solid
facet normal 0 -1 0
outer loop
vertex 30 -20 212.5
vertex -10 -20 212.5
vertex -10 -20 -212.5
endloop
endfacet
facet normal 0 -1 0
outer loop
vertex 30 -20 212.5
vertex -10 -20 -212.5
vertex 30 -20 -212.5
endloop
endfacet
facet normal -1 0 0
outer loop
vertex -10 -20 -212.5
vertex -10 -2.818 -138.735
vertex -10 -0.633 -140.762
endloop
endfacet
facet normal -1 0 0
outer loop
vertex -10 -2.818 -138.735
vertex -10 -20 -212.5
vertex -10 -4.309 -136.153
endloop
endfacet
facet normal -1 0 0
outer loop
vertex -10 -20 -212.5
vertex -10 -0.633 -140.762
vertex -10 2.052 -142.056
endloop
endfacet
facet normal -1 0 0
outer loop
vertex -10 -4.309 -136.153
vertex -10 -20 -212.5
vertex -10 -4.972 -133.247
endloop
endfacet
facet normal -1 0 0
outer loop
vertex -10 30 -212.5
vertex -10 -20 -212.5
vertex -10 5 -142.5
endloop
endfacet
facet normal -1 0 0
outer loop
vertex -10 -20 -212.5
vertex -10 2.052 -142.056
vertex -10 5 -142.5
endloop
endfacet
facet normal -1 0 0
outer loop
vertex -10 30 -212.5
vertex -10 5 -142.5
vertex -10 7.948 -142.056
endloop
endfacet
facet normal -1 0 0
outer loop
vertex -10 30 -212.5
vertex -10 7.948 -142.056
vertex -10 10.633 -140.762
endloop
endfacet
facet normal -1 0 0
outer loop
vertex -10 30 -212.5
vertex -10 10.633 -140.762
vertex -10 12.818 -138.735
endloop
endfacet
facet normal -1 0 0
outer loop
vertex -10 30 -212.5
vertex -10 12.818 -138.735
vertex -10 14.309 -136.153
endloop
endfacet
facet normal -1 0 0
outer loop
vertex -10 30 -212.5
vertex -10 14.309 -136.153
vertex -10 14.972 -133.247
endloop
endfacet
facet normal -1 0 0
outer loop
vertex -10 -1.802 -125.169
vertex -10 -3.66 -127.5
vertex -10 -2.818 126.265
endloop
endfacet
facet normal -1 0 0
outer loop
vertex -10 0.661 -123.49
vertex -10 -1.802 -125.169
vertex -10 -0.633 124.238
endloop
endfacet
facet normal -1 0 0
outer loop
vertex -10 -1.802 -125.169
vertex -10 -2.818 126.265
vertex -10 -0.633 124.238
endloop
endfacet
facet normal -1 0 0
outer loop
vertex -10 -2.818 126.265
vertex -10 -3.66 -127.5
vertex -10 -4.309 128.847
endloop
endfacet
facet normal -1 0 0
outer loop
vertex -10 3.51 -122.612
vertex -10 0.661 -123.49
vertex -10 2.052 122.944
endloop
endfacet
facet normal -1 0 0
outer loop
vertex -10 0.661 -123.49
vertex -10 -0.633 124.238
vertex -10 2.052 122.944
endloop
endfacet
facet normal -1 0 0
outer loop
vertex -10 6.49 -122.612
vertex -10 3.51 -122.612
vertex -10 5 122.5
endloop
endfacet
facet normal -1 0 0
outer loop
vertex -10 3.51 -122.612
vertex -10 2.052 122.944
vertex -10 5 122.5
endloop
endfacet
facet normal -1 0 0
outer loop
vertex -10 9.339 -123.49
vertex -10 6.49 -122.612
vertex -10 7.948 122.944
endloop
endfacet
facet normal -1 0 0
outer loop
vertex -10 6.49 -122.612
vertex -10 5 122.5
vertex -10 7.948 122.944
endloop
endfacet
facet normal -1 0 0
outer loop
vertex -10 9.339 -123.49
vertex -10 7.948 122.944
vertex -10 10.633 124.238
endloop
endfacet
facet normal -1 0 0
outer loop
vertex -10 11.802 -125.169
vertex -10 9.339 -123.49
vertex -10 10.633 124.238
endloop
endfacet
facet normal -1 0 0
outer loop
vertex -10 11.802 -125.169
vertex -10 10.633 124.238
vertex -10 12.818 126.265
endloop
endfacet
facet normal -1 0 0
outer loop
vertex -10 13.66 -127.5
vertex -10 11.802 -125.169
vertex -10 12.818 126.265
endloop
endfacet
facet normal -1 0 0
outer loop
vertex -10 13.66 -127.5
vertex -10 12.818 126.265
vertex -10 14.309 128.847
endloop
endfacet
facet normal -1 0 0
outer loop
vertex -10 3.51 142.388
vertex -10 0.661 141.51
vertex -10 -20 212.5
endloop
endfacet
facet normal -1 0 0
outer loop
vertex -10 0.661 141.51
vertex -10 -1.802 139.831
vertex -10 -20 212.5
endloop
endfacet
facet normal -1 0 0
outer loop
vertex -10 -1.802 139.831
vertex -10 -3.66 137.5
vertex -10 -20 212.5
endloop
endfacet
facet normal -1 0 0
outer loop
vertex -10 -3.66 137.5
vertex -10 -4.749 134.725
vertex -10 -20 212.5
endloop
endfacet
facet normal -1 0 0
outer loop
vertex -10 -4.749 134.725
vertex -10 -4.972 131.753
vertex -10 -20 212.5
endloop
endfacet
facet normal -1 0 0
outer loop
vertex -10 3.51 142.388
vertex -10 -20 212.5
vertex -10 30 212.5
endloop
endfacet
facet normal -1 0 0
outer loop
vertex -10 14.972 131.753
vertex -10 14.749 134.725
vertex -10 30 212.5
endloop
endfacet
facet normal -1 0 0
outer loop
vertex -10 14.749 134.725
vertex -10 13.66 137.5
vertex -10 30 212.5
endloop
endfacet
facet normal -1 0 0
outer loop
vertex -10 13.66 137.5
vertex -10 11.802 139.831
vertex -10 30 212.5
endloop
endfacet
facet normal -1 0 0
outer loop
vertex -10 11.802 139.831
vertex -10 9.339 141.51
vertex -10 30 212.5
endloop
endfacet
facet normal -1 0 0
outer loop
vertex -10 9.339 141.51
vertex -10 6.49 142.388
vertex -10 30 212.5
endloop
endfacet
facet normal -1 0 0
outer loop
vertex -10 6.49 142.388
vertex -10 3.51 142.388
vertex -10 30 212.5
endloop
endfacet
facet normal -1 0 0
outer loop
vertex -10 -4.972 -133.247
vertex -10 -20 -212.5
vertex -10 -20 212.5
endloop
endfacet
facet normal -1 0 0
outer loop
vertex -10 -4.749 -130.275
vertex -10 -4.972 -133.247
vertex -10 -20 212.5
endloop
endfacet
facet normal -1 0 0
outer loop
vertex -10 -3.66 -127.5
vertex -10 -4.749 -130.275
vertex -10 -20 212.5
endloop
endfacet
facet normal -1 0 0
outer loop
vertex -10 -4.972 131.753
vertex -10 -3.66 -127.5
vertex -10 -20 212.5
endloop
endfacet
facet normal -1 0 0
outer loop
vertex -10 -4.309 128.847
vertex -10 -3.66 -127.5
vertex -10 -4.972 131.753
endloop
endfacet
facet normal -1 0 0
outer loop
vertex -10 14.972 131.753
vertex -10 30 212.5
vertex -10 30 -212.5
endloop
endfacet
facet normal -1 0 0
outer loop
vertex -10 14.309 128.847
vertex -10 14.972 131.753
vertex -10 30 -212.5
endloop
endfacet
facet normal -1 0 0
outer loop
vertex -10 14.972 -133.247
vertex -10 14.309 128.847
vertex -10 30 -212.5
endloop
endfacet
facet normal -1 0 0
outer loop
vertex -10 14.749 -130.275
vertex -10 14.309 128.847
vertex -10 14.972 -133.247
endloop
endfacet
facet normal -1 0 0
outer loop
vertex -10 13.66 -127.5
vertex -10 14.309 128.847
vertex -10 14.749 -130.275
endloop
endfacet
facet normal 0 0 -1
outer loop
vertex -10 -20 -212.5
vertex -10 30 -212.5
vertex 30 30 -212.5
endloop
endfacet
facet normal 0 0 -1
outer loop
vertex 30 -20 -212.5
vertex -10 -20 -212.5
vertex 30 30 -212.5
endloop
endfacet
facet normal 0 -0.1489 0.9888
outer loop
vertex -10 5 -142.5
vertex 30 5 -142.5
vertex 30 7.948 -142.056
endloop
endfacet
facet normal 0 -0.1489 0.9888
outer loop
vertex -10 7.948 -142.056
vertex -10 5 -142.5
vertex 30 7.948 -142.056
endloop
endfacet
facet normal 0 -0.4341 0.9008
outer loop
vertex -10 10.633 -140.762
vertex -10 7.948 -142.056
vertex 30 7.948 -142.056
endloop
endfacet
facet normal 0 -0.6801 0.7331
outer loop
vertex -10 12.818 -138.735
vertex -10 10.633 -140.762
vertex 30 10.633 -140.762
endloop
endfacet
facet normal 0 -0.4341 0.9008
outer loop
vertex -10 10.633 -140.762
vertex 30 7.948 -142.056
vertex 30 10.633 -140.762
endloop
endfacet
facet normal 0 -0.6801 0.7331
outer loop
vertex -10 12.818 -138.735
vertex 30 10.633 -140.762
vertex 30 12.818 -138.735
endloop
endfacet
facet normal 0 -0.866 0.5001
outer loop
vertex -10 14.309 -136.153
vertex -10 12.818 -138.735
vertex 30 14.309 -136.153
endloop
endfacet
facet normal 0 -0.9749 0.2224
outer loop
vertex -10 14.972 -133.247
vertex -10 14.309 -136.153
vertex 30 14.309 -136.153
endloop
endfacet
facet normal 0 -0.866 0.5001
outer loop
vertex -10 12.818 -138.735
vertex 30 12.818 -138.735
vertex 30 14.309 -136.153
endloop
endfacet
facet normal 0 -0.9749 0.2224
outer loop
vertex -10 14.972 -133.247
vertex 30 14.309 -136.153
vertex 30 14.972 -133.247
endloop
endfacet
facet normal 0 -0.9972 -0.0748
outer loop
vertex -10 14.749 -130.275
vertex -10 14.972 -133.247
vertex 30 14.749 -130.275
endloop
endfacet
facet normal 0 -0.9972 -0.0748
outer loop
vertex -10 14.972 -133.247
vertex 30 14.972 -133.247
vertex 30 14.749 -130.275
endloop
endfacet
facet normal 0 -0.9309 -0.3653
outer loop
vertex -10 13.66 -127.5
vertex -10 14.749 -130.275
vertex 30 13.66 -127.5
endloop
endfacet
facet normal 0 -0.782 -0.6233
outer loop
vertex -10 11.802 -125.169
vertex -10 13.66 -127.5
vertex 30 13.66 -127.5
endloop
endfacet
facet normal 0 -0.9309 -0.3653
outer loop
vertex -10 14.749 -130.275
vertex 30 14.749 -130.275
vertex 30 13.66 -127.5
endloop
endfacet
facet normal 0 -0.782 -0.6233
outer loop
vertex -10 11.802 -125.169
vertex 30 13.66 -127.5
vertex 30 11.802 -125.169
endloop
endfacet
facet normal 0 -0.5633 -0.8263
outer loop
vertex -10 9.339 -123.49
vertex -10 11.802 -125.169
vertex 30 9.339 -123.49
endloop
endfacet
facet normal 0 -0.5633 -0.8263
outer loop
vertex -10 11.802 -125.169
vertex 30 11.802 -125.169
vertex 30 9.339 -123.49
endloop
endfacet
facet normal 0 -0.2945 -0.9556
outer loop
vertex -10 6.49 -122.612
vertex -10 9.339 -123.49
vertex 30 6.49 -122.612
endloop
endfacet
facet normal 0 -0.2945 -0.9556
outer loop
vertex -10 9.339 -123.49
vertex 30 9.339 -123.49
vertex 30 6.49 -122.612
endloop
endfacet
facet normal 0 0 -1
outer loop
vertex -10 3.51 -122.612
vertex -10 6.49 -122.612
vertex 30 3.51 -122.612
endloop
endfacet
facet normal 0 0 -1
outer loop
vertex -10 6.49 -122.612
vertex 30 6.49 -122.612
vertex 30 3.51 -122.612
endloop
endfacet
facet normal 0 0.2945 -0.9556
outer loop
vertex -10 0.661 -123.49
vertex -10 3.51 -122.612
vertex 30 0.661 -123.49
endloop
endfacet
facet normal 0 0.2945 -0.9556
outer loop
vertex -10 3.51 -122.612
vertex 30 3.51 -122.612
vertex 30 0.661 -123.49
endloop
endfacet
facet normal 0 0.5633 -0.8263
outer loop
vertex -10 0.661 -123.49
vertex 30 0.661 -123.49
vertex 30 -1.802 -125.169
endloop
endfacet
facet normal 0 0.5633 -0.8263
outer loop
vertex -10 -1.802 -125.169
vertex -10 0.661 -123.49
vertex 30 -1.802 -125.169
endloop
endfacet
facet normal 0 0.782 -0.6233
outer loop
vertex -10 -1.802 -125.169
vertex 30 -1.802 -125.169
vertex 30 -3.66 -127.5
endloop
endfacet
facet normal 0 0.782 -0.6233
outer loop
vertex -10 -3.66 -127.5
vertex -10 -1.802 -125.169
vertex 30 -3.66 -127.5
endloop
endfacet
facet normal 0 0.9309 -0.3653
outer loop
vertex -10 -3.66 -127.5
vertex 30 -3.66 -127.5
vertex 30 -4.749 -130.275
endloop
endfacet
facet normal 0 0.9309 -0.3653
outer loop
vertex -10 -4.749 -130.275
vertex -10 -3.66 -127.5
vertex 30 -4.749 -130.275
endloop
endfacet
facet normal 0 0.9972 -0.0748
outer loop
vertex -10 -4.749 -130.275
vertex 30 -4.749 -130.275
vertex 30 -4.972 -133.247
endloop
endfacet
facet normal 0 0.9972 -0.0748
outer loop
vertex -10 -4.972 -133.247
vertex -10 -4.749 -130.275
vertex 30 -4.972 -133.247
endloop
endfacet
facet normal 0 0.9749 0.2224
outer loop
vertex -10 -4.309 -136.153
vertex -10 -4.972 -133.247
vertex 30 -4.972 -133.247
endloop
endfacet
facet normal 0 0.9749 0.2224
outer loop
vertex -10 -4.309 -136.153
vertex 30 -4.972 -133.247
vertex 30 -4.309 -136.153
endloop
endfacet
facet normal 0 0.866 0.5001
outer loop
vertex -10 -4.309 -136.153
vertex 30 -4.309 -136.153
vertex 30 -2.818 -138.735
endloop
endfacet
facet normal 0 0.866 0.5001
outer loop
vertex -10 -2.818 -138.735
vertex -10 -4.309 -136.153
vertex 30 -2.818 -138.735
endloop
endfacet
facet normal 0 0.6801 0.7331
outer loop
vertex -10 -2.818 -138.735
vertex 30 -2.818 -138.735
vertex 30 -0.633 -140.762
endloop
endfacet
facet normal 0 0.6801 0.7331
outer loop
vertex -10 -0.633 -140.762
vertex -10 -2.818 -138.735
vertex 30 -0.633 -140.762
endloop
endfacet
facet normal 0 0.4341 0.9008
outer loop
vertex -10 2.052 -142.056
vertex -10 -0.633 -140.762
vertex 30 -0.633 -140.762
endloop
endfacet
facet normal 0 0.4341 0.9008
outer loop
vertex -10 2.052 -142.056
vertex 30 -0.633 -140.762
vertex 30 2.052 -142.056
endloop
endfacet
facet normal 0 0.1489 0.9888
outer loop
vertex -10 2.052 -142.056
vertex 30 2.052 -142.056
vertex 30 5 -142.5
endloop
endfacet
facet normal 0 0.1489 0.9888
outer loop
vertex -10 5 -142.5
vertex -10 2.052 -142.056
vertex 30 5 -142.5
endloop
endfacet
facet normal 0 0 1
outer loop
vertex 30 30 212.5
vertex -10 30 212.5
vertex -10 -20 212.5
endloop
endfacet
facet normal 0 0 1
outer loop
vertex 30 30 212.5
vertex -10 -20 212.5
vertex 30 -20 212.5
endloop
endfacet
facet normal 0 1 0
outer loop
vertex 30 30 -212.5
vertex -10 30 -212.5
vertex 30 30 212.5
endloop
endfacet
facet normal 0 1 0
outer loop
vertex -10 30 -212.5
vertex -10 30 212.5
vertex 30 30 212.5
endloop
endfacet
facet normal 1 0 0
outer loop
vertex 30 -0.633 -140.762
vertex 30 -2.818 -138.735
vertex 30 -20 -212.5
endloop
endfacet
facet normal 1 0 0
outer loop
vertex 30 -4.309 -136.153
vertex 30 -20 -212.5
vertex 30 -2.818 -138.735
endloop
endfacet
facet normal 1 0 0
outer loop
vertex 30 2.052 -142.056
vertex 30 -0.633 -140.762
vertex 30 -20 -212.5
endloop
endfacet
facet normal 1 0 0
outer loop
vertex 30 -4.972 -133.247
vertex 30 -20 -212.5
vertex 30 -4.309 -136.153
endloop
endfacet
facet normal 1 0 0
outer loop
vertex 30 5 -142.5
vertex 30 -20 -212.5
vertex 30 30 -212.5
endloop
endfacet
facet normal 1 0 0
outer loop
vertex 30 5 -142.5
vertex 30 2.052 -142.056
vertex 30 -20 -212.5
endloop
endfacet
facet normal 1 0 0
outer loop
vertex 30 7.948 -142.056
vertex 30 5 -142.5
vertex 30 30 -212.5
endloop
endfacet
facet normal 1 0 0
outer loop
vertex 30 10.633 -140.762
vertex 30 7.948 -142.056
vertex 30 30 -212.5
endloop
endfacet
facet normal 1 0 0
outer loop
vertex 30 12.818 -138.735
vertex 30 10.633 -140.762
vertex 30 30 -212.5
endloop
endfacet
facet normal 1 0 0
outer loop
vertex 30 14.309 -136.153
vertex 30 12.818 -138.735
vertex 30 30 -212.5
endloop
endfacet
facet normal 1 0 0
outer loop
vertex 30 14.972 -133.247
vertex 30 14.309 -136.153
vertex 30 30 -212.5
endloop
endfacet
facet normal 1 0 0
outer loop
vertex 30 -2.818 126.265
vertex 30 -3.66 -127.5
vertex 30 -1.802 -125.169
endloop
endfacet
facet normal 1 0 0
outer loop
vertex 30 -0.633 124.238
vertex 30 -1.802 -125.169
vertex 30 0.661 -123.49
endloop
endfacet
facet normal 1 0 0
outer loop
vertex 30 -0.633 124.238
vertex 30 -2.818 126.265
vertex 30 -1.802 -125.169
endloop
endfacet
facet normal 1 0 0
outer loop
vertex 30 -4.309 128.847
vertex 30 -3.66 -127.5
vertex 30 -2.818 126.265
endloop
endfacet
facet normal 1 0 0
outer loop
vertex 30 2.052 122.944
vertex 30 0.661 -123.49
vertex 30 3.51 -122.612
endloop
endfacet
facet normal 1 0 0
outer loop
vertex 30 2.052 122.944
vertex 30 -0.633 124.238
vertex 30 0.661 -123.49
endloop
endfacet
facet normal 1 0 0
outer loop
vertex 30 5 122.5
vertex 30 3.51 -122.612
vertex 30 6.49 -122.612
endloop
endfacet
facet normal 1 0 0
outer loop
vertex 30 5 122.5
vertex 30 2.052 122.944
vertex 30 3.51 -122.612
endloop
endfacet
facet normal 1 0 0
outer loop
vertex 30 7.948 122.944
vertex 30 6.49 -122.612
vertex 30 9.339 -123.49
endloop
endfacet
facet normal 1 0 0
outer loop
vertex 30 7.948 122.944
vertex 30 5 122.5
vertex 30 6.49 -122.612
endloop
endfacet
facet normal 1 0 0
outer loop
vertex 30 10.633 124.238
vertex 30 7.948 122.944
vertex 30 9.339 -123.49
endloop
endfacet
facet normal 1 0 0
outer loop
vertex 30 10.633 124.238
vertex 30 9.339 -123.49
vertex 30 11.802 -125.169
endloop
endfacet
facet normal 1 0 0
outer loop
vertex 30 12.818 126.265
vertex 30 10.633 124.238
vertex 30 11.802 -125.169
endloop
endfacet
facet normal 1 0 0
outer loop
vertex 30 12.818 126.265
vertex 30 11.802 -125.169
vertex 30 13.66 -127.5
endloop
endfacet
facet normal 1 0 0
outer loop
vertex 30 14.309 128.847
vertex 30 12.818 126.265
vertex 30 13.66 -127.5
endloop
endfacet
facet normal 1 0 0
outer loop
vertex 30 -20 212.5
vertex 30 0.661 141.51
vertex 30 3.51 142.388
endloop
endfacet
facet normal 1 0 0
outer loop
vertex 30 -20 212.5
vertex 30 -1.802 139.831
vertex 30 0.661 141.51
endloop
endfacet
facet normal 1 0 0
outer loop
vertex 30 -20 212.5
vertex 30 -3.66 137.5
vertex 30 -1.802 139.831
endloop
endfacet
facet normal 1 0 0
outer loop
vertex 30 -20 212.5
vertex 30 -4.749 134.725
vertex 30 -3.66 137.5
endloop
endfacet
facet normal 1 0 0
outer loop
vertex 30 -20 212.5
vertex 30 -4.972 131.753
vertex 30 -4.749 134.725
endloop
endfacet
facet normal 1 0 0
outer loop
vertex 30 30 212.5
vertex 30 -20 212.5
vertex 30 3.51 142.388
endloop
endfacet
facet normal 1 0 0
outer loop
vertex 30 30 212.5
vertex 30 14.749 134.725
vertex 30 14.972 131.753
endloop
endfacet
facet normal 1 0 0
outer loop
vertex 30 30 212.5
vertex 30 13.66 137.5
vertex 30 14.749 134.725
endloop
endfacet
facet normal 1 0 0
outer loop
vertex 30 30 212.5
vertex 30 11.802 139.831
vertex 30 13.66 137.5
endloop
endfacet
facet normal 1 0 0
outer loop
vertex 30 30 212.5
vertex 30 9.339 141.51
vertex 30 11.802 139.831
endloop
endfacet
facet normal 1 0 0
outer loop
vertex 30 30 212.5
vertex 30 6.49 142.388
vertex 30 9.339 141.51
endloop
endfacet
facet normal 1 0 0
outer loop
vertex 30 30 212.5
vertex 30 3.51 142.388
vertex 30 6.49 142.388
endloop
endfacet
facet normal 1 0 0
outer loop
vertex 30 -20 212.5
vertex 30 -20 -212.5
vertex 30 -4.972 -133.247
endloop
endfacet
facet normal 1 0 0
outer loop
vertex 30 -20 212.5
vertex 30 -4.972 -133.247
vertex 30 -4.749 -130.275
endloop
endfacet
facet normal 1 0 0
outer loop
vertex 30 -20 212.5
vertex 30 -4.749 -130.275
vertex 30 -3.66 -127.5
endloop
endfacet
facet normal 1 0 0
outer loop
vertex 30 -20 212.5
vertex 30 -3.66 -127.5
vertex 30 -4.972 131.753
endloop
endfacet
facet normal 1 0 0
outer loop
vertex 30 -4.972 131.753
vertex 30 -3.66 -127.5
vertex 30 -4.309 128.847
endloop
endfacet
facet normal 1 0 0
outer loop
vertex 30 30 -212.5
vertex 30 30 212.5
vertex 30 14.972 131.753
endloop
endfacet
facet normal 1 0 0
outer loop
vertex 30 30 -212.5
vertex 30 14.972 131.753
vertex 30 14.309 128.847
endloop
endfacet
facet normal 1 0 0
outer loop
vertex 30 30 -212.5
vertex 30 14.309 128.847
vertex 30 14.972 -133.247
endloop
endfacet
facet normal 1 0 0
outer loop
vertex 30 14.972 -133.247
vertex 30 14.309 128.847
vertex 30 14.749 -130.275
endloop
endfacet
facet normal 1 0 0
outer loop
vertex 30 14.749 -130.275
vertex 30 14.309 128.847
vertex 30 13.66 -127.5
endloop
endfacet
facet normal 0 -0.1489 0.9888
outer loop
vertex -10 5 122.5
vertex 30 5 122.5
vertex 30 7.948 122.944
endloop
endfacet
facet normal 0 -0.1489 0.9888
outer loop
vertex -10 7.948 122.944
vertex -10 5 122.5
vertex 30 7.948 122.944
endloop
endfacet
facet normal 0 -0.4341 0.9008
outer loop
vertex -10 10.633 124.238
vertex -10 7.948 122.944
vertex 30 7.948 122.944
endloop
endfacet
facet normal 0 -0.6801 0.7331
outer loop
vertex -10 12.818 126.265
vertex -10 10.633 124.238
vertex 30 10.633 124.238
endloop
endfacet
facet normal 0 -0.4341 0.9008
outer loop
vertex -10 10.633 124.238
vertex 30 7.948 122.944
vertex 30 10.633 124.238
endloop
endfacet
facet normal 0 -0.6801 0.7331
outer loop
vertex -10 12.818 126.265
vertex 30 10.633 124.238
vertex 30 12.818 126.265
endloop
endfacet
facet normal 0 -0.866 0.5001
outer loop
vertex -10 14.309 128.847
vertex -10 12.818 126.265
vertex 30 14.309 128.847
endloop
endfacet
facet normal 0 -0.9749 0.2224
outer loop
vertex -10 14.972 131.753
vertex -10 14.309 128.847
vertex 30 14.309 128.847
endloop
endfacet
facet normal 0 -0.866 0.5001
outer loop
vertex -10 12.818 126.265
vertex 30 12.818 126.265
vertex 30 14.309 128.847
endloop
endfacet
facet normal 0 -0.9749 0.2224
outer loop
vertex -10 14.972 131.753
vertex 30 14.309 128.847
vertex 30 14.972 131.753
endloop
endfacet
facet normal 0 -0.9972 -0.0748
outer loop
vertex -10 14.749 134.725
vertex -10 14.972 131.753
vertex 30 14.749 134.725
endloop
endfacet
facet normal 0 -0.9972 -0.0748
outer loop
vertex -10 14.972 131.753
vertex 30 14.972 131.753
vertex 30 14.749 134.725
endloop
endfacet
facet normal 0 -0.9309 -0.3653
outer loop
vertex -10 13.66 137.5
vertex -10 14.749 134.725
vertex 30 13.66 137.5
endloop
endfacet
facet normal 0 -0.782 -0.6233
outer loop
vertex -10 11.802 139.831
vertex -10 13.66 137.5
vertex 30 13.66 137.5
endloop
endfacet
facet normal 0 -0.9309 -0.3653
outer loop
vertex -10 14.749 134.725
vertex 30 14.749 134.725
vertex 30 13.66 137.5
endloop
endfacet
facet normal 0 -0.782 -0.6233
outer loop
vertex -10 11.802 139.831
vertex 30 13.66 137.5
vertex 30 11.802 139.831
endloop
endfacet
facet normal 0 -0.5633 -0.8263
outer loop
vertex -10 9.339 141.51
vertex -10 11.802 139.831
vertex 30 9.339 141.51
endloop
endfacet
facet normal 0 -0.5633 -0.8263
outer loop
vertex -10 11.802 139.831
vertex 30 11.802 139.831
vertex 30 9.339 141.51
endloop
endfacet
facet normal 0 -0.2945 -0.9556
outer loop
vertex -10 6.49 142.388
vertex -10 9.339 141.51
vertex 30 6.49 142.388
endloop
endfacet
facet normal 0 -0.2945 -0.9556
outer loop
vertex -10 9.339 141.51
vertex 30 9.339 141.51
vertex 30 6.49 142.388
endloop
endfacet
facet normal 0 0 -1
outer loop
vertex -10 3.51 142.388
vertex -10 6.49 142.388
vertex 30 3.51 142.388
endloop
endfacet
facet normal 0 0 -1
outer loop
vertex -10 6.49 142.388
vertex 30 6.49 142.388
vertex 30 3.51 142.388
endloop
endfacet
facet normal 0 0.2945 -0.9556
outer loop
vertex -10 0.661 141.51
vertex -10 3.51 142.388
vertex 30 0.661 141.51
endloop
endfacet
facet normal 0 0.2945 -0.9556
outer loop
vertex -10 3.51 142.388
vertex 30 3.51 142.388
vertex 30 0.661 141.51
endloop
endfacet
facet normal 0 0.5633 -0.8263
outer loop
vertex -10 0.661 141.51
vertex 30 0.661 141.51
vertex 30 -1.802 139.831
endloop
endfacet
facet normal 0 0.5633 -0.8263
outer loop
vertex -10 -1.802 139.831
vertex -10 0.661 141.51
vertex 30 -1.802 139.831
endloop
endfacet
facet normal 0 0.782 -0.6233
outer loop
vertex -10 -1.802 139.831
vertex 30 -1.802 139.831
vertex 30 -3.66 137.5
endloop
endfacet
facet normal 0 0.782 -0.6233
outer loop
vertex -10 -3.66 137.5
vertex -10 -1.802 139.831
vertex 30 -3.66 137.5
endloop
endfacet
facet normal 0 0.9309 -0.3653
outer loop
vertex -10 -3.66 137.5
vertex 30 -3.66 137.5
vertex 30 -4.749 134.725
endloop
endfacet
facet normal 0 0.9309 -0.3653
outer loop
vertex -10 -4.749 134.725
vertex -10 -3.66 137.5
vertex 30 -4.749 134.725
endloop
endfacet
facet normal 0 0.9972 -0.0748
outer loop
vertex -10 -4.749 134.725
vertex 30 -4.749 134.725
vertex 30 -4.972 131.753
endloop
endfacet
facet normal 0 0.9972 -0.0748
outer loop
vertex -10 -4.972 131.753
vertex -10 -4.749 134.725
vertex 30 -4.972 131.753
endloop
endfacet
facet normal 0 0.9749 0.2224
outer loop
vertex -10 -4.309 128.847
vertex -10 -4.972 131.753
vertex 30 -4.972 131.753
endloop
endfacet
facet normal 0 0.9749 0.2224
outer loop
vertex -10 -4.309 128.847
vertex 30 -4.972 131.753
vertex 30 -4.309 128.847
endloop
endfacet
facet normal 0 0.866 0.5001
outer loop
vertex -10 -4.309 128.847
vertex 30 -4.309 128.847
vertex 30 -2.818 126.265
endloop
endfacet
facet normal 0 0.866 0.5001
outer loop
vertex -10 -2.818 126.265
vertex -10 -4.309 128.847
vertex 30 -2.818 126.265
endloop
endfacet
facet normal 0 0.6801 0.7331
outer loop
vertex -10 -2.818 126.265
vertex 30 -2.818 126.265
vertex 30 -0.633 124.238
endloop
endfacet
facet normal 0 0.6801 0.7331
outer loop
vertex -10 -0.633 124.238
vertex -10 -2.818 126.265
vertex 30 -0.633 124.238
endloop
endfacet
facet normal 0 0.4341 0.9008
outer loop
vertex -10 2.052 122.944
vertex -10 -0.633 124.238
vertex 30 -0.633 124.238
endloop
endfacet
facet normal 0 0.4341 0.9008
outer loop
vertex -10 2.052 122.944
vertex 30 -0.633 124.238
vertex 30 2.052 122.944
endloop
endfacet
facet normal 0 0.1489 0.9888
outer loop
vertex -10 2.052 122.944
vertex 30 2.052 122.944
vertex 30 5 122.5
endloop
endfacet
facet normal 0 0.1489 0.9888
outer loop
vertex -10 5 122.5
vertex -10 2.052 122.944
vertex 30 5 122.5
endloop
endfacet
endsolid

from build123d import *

# Parameters (mm, degrees)
SKETCH_1_W          = 40
SKETCH_1_H          = 50
EXTRUDE_1_DEPTH     = 212.5
CUT_EXTRUDE_1_REACH = 220.303
SKETCH_2_R          = 10


with BuildPart() as part:
    # 草图1 → 凸台-拉伸1 (new, symmetric)
    with BuildSketch(Plane.XY):
        with Locations((10, 5)):
            Rectangle(SKETCH_1_W, SKETCH_1_H)
    extrude(amount=EXTRUDE_1_DEPTH, both=True)

    # 草图2 → 切除-拉伸1 (cut, up to next)
    with BuildSketch(Plane(origin=(30, 0, 0), x_dir=(0, 0, -1), z_dir=(1, 0, 0)), mode=Mode.PRIVATE) as cut_extrude_1_sk1:
        with Locations((-132.5, 5)):
            Circle(SKETCH_2_R)
    cut_extrude_1_tool1 = extrude(cut_extrude_1_sk1.sketch, amount=-CUT_EXTRUDE_1_REACH, mode=Mode.PRIVATE) & part.part
    # 草图2 → 切除-拉伸1 (cut, up to next)
    with BuildSketch(Plane(origin=(30, 0, 0), x_dir=(0, 0, -1), z_dir=(1, 0, 0)), mode=Mode.PRIVATE) as cut_extrude_1_sk2:
        with Locations((132.5, 5)):
            Circle(SKETCH_2_R)
    cut_extrude_1_tool2 = extrude(cut_extrude_1_sk2.sketch, amount=-CUT_EXTRUDE_1_REACH, mode=Mode.PRIVATE) & part.part
    add(cut_extrude_1_tool1.solids().sort_by_distance((30, 5, 132.5))[0], mode=Mode.SUBTRACT)
    add(cut_extrude_1_tool2.solids().sort_by_distance((30, 5, -132.5))[0], mode=Mode.SUBTRACT)


solid = part.part
